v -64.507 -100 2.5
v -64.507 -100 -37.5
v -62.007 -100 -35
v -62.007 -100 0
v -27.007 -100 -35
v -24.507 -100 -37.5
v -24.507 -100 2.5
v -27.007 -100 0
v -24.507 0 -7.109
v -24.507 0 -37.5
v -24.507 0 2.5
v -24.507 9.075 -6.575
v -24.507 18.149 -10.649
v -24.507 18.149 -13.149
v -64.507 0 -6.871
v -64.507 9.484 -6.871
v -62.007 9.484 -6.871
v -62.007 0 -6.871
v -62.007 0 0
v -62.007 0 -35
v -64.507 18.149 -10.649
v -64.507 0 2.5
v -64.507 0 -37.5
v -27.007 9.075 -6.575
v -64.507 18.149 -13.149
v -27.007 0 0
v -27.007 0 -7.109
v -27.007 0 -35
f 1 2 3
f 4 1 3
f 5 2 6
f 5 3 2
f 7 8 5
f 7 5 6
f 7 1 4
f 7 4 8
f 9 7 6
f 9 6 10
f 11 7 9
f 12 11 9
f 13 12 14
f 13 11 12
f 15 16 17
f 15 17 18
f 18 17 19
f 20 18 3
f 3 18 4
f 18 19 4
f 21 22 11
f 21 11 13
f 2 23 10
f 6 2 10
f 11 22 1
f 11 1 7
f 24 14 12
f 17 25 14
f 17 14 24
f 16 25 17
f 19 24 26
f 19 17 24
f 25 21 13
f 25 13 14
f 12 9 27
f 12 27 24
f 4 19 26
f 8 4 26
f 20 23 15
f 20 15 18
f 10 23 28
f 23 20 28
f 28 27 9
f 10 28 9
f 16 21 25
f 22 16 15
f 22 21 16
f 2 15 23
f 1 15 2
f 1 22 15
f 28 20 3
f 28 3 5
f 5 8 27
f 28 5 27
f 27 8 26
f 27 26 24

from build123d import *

# Parameters (mm, degrees)
F0_W     = 40
F0_H     = 40
F0_W_2   = 35
F0_H_2   = 35
F1_DEPTH = 100
F3_DEPTH = 40
F5_DEPTH = 2.5
F7_DEPTH = 2.5


with BuildPart() as f1:
    # F0 (on Front) → F1 (new body)
    with BuildSketch(Plane.XZ):
        with Locations((-44.507358, -17.5)):
            Rectangle(F0_W, F0_H)
        with Locations((-44.507358, -17.5)):
            Rectangle(F0_W_2, F0_H_2, mode=Mode.SUBTRACT)
    extrude(amount=F1_DEPTH)

    # F2 (on face) → F3 (join)
    with BuildSketch(Plane(origin=(-64.507358, 0, 0), x_dir=(0, -1, 0), z_dir=(-1, 0, 0))):
        Polygon((0, 0), (0, 2.5), (-18.149041, -10.649037), (-18.149041, -13.149037), align=None)
    extrude(amount=-F3_DEPTH)

    # F4 (on face) → F5 (join)
    with BuildSketch(Plane(origin=(-64.507358, 0, 0), x_dir=(0, -1, 0), z_dir=(-1, 0, 0))):
        Polygon((0, 0), (-9.484176, -6.871315), (0, -6.871315), align=None)
    extrude(amount=-F5_DEPTH)

    # F6 (on face) → F7 (join)
    with BuildSketch(Plane.YZ.offset(-24.507358)):
        Polygon((9.07452, -6.574518), (0, 0), (0, -7.108711), align=None)
    extrude(amount=-F7_DEPTH)


solid = f1.part
